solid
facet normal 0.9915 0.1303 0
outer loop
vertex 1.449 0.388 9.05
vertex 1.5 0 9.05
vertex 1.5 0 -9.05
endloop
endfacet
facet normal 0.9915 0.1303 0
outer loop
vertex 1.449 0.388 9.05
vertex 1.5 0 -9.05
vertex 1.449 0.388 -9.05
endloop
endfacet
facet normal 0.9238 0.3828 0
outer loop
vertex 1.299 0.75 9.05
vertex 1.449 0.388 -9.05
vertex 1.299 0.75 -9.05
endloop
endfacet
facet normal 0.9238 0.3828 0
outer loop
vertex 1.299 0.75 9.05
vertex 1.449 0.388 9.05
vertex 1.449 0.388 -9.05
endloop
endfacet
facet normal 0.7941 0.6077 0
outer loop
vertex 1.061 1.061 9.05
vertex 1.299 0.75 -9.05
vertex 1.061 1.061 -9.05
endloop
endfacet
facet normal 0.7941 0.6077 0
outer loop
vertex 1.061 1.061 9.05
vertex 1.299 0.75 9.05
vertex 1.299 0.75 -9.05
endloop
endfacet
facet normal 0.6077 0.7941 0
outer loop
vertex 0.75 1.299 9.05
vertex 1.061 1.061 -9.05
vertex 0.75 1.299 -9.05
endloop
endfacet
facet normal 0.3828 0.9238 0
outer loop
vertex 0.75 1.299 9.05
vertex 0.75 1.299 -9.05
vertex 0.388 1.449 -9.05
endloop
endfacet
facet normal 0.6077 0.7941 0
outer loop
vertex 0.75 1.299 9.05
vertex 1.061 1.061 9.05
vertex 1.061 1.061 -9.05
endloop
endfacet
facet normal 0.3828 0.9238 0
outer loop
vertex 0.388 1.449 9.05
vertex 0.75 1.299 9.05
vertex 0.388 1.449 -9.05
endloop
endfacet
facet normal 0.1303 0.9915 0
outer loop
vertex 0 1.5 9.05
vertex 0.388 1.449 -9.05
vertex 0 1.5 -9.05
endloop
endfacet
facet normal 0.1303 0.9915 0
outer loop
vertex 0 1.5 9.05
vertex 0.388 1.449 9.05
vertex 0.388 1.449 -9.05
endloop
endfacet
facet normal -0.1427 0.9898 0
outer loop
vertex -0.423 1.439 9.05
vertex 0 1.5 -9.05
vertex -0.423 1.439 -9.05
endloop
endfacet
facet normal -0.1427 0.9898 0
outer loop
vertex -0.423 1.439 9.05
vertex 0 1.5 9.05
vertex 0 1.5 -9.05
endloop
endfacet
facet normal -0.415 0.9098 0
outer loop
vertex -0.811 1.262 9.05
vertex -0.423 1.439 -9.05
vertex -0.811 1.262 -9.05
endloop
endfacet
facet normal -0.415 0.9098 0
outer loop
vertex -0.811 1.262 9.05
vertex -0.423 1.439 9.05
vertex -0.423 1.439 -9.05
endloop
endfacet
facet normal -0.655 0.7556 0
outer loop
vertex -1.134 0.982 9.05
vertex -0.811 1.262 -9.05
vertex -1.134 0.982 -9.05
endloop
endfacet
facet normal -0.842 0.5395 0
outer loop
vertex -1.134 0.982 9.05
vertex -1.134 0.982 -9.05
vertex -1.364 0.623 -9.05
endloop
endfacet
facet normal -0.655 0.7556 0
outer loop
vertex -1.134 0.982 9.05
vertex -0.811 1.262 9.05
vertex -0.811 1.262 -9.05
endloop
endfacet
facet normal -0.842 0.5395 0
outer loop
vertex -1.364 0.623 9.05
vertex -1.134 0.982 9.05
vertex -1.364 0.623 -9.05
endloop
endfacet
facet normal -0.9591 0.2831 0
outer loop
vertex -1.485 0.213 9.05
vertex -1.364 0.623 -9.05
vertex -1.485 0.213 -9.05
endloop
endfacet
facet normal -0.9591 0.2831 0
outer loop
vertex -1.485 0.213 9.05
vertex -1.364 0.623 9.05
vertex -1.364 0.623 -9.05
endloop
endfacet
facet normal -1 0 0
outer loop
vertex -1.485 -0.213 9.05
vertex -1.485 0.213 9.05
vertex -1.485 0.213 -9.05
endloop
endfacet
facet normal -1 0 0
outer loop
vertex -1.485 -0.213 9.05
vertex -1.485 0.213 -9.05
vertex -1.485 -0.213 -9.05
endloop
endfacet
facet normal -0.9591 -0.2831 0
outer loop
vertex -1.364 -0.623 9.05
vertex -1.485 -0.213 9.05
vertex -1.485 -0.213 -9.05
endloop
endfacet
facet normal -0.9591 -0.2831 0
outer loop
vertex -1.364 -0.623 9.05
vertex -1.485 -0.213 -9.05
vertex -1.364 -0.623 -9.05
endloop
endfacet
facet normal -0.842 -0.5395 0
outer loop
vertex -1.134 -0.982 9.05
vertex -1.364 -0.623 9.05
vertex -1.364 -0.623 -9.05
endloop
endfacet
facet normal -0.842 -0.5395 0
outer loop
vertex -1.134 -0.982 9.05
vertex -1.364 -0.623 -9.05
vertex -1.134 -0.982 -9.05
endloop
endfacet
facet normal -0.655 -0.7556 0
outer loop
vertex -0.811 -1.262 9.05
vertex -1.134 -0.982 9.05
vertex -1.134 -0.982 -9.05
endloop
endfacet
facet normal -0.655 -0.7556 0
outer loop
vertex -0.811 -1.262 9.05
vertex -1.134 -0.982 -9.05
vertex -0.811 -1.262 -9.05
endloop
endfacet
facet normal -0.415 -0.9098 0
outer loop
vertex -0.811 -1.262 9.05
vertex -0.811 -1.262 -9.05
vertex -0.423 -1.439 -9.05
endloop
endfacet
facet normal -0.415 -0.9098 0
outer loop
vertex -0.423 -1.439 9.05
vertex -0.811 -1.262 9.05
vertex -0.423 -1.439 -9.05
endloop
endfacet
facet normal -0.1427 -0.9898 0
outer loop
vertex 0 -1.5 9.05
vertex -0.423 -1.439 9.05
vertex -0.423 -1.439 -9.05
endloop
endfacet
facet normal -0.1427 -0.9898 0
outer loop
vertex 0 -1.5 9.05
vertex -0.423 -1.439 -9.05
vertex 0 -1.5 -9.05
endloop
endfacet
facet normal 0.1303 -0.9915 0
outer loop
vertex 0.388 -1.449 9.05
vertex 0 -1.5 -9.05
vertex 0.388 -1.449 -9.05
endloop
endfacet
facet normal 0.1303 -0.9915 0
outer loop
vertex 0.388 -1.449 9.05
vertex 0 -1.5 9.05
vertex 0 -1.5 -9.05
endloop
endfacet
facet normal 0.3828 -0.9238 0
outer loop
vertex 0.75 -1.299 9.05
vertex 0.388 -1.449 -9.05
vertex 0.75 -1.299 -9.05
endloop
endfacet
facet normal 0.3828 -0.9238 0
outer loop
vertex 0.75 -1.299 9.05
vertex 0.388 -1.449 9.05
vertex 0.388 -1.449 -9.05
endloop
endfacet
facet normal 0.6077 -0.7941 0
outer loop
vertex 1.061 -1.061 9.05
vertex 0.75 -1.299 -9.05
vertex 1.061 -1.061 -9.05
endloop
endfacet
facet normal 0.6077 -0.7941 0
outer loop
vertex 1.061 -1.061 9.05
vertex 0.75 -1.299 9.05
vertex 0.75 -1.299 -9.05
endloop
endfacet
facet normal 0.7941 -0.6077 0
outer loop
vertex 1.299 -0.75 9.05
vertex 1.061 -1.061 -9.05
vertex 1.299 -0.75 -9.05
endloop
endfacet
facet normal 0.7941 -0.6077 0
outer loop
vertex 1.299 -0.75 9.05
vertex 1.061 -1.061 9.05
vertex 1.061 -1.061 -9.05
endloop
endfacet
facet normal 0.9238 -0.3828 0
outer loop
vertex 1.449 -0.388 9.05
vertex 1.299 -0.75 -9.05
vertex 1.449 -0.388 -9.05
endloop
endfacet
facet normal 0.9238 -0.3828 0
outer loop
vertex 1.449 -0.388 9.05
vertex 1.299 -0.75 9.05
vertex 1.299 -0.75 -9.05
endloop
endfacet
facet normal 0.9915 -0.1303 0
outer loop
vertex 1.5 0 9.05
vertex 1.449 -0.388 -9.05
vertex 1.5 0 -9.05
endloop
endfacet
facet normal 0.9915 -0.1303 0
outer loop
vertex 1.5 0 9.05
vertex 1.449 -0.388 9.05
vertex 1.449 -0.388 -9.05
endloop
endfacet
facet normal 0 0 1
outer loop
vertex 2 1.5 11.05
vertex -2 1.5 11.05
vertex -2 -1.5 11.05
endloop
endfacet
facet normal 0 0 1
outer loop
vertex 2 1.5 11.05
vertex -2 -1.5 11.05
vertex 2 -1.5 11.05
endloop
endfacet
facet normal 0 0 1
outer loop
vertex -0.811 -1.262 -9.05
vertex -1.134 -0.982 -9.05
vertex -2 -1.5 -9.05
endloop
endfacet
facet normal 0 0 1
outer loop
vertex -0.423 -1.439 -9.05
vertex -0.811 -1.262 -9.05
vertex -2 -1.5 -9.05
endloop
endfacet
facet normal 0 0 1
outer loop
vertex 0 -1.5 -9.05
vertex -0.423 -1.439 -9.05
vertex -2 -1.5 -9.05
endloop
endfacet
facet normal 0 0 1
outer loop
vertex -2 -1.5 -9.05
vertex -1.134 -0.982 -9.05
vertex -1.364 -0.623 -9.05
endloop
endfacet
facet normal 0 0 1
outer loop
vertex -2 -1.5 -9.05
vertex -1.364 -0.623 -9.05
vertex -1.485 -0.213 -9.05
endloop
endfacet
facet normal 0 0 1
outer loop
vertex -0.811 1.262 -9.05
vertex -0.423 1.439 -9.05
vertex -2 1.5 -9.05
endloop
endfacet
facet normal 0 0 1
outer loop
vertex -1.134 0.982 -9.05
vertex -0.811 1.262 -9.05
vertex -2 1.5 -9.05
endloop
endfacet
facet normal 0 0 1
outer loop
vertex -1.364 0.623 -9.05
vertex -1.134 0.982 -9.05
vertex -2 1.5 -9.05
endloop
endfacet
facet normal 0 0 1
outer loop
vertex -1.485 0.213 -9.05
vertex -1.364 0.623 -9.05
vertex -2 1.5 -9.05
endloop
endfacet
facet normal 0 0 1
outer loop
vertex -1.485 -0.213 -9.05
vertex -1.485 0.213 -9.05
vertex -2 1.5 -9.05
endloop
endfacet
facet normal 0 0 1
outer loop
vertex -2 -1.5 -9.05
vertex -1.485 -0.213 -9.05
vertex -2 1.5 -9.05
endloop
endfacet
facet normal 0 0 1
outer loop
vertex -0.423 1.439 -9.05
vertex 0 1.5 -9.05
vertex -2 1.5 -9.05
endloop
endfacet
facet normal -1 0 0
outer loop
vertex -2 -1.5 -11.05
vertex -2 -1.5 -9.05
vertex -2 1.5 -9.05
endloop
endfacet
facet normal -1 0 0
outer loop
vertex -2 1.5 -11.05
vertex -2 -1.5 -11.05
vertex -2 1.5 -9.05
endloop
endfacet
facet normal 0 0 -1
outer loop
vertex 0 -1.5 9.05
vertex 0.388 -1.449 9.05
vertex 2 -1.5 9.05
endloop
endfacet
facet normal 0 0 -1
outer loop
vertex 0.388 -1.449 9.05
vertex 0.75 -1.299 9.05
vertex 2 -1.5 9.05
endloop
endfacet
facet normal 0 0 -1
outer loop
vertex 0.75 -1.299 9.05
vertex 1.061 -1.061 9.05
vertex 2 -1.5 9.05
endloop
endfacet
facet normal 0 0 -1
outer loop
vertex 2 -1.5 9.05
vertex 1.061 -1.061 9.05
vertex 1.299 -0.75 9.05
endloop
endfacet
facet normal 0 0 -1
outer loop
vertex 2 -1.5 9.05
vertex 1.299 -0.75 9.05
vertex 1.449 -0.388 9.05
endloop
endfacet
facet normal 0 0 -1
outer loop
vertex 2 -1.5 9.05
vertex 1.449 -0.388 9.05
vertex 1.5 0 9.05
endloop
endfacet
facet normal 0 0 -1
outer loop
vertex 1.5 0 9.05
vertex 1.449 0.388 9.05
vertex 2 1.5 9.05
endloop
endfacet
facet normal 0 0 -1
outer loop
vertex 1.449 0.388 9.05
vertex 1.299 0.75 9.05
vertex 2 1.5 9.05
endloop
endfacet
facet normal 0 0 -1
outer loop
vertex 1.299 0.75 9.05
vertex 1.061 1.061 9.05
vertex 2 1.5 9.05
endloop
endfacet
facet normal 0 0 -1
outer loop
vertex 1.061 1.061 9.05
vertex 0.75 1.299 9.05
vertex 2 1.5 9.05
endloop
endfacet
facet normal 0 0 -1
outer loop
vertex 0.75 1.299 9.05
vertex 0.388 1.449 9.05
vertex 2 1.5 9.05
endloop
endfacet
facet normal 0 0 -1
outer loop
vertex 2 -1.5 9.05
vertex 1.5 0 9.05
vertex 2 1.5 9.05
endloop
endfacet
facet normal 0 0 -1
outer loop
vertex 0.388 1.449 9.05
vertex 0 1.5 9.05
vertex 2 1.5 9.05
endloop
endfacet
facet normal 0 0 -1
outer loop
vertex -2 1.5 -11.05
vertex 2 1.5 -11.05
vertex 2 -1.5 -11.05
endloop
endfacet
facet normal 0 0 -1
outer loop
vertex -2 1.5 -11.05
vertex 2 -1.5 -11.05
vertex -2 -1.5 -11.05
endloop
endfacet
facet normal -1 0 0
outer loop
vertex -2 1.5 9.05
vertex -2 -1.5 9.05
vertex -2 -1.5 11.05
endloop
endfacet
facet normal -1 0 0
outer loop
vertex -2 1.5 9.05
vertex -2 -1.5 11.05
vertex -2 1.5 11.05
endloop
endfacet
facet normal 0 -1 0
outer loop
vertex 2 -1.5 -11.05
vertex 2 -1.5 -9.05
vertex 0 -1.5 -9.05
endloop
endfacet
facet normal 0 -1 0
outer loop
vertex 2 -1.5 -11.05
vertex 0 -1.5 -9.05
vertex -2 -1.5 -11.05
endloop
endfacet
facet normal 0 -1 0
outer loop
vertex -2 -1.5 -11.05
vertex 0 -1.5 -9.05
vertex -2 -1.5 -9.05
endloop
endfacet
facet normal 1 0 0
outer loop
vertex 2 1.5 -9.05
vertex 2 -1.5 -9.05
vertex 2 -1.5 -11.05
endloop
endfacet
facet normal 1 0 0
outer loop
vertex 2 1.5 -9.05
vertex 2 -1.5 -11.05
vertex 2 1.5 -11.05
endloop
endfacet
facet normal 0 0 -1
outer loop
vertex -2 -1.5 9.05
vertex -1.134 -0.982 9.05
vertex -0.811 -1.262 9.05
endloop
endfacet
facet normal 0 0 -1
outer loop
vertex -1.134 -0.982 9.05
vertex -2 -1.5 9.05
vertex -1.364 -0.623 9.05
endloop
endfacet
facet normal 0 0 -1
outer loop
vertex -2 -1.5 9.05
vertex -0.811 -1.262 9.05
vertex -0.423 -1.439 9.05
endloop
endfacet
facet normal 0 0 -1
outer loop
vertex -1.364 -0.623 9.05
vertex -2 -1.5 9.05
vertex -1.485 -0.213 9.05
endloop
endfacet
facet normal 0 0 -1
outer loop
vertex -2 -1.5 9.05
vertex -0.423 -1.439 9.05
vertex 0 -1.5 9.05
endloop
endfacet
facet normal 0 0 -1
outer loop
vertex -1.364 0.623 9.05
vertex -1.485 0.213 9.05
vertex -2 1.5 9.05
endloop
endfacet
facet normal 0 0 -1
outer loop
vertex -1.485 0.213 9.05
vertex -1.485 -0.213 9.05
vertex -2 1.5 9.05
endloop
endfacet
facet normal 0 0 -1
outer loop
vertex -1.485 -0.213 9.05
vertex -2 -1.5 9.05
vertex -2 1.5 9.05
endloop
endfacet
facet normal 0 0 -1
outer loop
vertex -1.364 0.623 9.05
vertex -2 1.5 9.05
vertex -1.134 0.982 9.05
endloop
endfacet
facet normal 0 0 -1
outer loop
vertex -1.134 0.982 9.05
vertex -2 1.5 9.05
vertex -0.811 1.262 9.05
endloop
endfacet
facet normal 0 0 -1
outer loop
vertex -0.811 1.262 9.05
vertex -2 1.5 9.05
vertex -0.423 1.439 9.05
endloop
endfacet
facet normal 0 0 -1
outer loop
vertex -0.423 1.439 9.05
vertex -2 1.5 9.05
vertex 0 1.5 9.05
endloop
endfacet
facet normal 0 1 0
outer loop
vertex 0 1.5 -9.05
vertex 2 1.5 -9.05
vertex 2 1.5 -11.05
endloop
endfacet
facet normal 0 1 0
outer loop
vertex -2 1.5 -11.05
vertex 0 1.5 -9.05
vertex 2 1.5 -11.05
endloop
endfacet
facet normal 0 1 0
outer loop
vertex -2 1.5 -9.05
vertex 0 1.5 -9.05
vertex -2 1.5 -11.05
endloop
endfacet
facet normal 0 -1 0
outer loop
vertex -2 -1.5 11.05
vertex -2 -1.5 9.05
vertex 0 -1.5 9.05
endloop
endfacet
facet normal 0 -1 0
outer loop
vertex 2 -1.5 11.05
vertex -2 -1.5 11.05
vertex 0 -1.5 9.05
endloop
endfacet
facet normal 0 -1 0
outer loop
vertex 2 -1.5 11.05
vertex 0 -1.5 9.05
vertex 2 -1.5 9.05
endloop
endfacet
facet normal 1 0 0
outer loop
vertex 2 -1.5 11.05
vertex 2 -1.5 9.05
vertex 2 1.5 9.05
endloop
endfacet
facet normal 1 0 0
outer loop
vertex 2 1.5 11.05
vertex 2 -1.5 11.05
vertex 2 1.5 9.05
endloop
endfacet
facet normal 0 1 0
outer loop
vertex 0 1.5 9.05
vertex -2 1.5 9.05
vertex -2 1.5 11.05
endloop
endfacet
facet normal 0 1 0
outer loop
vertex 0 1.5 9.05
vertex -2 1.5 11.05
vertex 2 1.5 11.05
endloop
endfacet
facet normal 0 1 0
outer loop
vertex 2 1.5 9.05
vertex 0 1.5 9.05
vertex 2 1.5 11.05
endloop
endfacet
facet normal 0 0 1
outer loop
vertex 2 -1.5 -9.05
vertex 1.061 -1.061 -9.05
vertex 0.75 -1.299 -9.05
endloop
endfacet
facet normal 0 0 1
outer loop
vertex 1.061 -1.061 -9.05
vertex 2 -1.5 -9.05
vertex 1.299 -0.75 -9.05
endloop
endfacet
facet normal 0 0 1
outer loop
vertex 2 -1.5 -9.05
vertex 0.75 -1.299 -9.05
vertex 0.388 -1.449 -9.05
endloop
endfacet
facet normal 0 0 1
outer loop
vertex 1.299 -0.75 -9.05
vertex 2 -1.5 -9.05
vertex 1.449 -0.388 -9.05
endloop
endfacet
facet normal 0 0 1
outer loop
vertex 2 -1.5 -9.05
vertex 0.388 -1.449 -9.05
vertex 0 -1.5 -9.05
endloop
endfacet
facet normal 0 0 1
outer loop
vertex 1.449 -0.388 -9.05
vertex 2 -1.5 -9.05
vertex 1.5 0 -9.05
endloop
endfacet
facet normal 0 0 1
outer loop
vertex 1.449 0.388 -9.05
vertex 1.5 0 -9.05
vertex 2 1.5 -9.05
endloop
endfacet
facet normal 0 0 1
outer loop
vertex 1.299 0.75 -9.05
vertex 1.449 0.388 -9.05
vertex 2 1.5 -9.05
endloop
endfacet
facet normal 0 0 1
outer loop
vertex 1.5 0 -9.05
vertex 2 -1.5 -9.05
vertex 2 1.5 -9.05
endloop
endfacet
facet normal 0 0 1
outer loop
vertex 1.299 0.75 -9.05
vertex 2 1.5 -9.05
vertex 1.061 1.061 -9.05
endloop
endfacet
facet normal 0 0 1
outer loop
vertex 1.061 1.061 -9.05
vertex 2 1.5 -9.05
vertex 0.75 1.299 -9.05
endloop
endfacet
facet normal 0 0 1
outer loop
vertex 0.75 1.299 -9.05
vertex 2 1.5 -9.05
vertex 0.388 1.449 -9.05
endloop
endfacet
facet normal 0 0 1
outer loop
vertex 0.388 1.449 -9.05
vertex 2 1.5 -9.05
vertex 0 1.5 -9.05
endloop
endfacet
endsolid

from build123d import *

# Parameters (mm, degrees)
SKETCH1_R           = 1.5
BOSS_EXTRUDE1_DEPTH = 9.05
SKETCH2_W           = 4
SKETCH2_H           = 3
BOSS_EXTRUDE2_DEPTH = 2
SKETCH3_W           = 4
SKETCH3_H           = 3
BOSS_EXTRUDE3_DEPTH = 2


with BuildPart() as part:
    # Sketch1 → Boss-Extrude1 (new body, symmetric)
    with BuildSketch(Plane.XY):
        Circle(SKETCH1_R)
    extrude(amount=BOSS_EXTRUDE1_DEPTH, both=True)

    # Sketch2 → Boss-Extrude2 (add)
    with BuildSketch(Plane.XY.offset(9.05)):
        Rectangle(SKETCH2_W, SKETCH2_H)
    extrude(amount=BOSS_EXTRUDE2_DEPTH)

    # Sketch3 → Boss-Extrude3 (add)
    with BuildSketch(Plane(origin=(0, 0, -9.05), x_dir=(-1, 0, 0), z_dir=(0, 0, -1))):
        Rectangle(SKETCH3_W, SKETCH3_H)
    extrude(amount=BOSS_EXTRUDE3_DEPTH)


solid = part.part
